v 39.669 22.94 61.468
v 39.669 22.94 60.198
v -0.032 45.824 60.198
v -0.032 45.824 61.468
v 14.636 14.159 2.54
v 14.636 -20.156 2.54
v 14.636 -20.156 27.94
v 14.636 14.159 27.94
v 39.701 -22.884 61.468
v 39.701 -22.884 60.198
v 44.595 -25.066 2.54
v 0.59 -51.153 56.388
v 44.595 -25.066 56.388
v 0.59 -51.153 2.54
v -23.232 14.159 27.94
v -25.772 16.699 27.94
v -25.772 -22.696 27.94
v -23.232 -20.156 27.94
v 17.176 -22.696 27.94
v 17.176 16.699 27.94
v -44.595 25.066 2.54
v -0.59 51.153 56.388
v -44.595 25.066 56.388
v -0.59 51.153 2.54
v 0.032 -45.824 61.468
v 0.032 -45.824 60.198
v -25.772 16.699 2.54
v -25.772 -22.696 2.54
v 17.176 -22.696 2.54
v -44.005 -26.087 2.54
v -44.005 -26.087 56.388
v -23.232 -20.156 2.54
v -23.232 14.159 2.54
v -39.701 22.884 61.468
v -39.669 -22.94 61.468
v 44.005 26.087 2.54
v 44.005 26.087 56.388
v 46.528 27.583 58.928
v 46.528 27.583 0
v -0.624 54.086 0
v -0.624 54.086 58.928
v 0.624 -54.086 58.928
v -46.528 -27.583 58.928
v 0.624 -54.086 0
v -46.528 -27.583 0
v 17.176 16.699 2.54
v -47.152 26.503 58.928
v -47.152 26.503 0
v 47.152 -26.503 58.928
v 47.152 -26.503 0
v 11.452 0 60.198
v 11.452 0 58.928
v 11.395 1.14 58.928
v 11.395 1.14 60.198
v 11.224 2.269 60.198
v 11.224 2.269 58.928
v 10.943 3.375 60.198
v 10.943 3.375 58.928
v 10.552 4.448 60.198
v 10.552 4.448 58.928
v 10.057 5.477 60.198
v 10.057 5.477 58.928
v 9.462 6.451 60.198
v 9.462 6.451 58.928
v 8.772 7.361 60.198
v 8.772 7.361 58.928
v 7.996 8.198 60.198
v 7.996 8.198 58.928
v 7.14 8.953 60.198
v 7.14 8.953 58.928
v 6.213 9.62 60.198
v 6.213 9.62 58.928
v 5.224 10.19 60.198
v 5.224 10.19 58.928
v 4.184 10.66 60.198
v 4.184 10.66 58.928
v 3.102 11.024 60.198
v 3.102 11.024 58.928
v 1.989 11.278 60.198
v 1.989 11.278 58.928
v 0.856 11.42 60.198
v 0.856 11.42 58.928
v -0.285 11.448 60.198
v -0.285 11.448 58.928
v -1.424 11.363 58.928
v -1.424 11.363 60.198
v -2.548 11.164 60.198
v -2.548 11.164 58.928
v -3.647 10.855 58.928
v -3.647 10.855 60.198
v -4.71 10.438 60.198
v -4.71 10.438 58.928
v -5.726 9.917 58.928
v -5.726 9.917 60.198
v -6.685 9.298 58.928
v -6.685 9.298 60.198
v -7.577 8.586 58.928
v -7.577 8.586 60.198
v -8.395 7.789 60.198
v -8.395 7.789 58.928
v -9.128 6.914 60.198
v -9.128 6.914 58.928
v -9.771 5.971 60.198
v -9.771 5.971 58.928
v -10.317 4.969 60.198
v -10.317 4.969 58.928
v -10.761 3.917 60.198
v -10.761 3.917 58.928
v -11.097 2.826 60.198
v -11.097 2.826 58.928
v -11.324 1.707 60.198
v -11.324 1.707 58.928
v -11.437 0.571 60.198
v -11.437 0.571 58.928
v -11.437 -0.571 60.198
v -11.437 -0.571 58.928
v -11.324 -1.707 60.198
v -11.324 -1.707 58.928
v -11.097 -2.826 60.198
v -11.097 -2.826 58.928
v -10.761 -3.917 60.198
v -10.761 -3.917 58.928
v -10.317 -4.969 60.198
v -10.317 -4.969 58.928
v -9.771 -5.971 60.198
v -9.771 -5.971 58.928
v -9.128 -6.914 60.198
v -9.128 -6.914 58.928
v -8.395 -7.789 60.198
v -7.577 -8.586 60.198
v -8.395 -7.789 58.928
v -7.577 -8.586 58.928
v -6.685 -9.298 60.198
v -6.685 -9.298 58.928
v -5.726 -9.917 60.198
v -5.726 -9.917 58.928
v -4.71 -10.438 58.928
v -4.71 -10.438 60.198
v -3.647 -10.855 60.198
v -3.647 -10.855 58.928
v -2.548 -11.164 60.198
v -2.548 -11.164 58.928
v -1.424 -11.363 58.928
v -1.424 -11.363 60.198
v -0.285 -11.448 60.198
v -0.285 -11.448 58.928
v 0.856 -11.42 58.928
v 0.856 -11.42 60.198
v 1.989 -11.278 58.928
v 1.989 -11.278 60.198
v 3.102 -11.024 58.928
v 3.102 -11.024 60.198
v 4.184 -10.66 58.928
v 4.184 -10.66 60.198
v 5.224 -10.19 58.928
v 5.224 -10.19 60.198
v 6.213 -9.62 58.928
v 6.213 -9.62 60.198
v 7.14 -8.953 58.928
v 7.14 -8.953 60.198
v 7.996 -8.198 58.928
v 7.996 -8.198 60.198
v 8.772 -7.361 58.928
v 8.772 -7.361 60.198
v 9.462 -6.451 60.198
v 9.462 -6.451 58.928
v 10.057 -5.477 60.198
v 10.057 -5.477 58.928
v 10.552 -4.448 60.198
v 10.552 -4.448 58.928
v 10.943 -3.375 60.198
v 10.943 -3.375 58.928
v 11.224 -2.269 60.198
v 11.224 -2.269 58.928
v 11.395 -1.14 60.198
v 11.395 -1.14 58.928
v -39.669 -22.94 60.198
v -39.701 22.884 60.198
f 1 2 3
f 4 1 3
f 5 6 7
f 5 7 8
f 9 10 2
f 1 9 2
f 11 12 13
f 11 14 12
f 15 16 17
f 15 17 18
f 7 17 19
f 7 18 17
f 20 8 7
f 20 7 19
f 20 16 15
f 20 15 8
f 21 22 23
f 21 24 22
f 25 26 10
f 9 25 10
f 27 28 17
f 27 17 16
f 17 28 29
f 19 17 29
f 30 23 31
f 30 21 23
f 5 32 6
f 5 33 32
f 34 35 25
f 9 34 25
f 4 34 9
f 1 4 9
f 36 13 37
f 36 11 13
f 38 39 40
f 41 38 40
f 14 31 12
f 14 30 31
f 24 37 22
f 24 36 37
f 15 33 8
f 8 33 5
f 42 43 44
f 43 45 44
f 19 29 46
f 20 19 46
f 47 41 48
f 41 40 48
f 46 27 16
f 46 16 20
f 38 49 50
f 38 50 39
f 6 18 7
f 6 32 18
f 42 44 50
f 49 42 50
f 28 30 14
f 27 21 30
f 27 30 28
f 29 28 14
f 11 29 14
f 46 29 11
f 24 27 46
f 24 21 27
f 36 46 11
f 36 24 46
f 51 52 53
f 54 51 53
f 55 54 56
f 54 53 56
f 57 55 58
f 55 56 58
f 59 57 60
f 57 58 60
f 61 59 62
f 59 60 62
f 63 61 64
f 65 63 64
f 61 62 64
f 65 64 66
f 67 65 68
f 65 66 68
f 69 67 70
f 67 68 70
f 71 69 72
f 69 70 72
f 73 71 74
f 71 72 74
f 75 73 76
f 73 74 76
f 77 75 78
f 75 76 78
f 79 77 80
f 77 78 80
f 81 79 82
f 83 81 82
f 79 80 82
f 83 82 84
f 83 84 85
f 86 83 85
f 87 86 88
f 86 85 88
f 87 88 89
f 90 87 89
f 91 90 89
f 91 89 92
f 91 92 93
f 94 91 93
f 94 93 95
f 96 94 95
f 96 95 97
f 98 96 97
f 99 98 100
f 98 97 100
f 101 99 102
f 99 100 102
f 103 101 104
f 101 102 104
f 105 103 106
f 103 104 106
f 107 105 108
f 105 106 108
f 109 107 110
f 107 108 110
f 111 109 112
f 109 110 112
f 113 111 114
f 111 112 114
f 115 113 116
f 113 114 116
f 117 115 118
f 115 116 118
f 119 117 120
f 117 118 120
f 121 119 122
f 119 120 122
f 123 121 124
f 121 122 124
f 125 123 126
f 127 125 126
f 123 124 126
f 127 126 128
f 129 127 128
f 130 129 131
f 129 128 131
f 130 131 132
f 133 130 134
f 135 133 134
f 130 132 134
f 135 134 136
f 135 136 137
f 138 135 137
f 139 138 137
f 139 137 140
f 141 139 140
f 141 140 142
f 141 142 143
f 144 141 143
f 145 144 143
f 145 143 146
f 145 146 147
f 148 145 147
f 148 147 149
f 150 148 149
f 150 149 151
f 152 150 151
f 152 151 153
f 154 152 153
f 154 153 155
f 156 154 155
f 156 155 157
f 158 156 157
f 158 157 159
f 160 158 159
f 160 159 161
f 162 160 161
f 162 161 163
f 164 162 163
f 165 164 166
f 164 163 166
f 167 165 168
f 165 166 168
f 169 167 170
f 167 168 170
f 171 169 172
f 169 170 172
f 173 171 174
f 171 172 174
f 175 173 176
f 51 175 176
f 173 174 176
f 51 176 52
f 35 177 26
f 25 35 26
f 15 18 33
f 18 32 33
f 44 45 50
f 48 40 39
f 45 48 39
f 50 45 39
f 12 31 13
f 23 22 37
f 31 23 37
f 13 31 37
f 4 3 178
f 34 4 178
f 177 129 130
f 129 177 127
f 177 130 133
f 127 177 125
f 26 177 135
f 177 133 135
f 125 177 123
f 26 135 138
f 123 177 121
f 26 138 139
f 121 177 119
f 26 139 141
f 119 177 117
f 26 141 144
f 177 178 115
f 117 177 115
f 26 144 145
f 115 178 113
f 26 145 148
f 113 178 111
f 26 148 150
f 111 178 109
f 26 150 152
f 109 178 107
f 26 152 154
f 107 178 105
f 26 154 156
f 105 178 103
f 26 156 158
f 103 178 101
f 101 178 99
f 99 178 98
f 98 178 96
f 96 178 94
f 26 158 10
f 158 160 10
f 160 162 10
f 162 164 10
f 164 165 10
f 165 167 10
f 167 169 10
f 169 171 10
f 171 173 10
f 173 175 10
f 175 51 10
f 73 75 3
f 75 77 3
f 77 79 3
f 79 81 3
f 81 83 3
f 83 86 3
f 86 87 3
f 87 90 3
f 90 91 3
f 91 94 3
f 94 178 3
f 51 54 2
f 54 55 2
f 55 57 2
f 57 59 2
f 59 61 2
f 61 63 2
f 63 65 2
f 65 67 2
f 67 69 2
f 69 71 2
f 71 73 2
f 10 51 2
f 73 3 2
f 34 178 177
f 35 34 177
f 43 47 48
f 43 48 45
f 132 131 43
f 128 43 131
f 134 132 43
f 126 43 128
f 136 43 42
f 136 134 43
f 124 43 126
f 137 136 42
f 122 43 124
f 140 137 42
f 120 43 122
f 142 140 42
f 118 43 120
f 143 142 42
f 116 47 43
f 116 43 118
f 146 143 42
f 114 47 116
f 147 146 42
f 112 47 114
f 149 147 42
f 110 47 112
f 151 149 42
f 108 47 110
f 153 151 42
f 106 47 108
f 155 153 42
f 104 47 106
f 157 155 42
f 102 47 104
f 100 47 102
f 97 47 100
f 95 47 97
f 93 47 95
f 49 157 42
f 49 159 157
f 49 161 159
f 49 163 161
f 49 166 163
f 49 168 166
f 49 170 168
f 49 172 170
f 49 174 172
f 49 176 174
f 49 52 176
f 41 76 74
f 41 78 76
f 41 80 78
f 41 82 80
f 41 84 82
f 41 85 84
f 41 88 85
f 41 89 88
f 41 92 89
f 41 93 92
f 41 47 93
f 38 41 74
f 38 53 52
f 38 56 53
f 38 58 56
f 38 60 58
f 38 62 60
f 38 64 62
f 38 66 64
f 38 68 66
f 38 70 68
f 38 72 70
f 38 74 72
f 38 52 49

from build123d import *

# Parameters (mm, degrees)
F1_DEPTH  = 56.388
F2_T      = -2.54
F3_W      = 42.9477673024
F3_H      = 39.3949486315
F4_DEPTH  = 25.4
F5_T      = -2.54
F7_DEPTH  = 2.54
F8_R      = 11.4515388828
F9_DEPTH  = 1.27
F11_DEPTH = 1.27


# Not quite as in the source:
# - a shell that OpenCascade refuses in one call is made with other operations: the cavity is built on its own and cut out


with BuildPart() as f1:
    # F0 (on Top) → F1 (new body)
    with BuildSketch(Plane.XY):
        Polygon((46.5280407677, 27.5831491618), (-0.6236875067, 54.0860398741), (-47.1517282744, 26.5028907122), (-46.5280407677, -27.5831491618), (0.6236875067, -54.0860398741), (47.1517282744, -26.5028907122), align=None)
    extrude(amount=F1_DEPTH)

    # F2
    f2_openings = [f1.faces().sort_by_distance(p)[0] for p in [
        (0, 0, 56.388),
    ]]
    offset(amount=F2_T, openings=f2_openings)

    # F3 (on face) → F4 (join)
    with BuildSketch(Plane.XY.offset(2.54)):
        with Locations((-4.2980322614, -2.9984135181)):
            Rectangle(F3_W, F3_H)
    extrude(amount=F4_DEPTH)

    # F5: a shell. OpenCascade refuses it in one call, so the cavity is built on its own and cut out:
    # the body offset inwards by the wall thickness, plus a prism from it out through each open face.
    f5_core = offset(f1.part, amount=F5_T, kind=Kind.INTERSECTION, mode=Mode.PRIVATE)
    f5_exits = [f5_core.faces().sort_by_distance(p)[0] for p in [
        (-4.298032, -2.998414, 25.4),
    ]]
    add(f5_core, mode=Mode.SUBTRACT)
    extrude(f5_exits, amount=-F5_T, mode=Mode.SUBTRACT)

    # F6 (on face) → F7 (join)
    with BuildSketch(Plane.XY.offset(56.388)):
        Polygon((46.5280407677, 27.5831491618), (-0.6236875067, 54.0860398741), (-47.1517282744, 26.5028907122), (-46.5280407677, -27.5831491618), (0.6236875067, -54.0860398741), (47.1517282744, -26.5028907122), align=None)
    extrude(amount=F7_DEPTH)

    # F8 (on face) → F9 (join)
    with BuildSketch(Plane.XY.offset(58.928)):
        Circle(F8_R)
    extrude(amount=F9_DEPTH)

    # F10 (on face) → F11 (join)
    with BuildSketch(Plane.XY.offset(60.198)):
        Polygon((39.6687044392, 22.9401686529), (-0.0324166009, 45.824190106), (-39.7011210401, 22.8840214531), (-39.6687044392, -22.9401686529), (0.0324166009, -45.824190106), (39.7011210401, -22.8840214531), align=None)
    extrude(amount=F11_DEPTH)


solid = f1.part
